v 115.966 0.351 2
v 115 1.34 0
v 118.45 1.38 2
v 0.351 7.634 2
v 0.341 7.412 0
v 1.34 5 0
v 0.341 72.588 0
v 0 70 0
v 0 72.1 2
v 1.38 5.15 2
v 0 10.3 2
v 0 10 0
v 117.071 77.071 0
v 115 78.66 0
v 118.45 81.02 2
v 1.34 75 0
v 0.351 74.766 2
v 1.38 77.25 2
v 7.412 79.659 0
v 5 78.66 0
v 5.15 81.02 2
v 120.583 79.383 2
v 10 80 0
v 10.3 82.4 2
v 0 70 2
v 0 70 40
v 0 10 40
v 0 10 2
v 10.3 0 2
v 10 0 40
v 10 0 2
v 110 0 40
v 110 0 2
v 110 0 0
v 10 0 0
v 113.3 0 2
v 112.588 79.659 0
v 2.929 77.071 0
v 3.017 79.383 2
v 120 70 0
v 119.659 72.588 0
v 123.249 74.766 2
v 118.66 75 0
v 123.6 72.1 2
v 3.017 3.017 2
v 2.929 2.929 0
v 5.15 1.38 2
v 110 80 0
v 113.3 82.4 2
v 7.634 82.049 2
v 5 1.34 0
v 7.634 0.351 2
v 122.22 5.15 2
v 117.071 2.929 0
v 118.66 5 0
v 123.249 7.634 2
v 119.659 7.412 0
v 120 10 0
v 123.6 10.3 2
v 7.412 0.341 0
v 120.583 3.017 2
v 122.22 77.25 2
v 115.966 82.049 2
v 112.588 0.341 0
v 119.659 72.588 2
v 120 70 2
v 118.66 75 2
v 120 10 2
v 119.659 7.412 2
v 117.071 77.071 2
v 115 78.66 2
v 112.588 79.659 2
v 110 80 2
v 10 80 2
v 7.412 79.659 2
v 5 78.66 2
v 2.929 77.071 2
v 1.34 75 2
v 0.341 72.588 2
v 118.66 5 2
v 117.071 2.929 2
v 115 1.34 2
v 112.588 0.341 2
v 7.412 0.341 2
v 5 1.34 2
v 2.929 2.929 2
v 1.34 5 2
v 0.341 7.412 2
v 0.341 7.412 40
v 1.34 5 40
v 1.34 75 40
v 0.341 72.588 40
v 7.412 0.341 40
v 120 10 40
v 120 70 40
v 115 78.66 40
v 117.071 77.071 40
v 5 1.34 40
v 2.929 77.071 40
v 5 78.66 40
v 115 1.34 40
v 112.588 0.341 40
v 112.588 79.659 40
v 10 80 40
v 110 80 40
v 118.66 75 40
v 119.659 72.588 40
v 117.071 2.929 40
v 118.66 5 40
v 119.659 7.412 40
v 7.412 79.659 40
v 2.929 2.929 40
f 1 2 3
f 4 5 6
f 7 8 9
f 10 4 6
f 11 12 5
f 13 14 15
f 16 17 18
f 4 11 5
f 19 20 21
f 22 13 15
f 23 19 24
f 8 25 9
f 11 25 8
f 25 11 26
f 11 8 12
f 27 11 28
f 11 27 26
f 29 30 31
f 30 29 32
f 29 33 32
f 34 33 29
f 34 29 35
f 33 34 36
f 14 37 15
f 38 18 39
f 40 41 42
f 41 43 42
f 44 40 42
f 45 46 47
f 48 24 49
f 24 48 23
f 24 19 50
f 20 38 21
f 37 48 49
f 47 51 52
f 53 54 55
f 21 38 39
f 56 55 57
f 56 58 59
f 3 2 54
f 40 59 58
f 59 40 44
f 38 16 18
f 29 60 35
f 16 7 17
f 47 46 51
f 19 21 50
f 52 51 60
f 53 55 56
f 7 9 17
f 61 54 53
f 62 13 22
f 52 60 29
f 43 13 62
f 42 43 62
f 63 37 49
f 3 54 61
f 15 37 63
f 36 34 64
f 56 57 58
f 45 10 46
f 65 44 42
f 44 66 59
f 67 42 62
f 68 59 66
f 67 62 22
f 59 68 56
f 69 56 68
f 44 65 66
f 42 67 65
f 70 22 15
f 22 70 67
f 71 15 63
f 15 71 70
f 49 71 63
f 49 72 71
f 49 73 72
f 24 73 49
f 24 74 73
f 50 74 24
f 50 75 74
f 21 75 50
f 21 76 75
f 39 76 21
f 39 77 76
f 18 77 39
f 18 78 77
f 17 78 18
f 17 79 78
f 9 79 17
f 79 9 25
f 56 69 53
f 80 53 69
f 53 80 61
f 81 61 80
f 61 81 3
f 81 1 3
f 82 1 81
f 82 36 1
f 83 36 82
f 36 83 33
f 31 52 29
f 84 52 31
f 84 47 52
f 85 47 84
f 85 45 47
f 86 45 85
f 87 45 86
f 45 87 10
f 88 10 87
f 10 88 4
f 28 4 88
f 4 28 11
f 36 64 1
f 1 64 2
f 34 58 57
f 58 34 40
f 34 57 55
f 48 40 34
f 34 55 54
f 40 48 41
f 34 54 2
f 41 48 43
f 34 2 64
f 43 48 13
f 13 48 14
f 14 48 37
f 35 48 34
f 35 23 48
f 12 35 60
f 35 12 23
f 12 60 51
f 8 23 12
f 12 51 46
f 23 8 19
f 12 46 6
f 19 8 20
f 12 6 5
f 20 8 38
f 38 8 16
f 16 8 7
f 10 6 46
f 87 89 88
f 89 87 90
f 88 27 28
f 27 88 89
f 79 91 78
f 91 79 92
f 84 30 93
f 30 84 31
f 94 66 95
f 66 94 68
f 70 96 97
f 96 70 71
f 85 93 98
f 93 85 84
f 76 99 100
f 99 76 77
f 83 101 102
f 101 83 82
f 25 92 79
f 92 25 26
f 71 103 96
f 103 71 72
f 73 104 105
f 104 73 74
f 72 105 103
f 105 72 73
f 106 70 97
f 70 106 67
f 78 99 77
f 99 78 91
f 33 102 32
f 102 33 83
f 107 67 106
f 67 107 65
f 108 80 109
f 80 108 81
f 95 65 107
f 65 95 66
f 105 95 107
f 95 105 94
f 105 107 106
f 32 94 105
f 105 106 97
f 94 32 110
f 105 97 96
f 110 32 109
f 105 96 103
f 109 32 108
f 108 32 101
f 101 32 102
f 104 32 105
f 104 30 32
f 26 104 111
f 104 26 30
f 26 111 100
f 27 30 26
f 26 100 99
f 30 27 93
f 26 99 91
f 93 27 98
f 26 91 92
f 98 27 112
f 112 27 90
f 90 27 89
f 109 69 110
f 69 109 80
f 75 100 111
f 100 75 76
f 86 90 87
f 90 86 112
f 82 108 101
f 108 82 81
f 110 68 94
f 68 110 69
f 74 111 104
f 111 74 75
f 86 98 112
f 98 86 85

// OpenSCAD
//==================================================
// Test - Rounded Bottom Edge
//==================================================


//--------------------------------------------------
// Parameters
//--------------------------------------------------

length = 120;
width  = 80;
height = 40;

corner_radius = 10;
bottom_radius = 2;

preview_fn = 24;
render_fn  = 64;

$fn = preview_fn;


//--------------------------------------------------
// Rounded rectangle
//--------------------------------------------------

module rounded_rectangle(l,w,r)
{

    hull()
    {

        translate([r,r])
            circle(r);

        translate([l-r,r])
            circle(r);

        translate([l-r,w-r])
            circle(r);

        translate([r,w-r])
            circle(r);

    }

}


//--------------------------------------------------
// Test object
//--------------------------------------------------

module test_box()
{

    union()
    {

        //--------------------------------------------------
        // Bottom rounded section
        //--------------------------------------------------

        linear_extrude(height = bottom_radius, scale = 1.03)
            rounded_rectangle(length,width,corner_radius);


        //--------------------------------------------------
        // Straight wall
        //--------------------------------------------------

        translate([0,0,bottom_radius])

        linear_extrude(height = height-bottom_radius)
            rounded_rectangle(length,width,corner_radius);

    }

}


test_box();
